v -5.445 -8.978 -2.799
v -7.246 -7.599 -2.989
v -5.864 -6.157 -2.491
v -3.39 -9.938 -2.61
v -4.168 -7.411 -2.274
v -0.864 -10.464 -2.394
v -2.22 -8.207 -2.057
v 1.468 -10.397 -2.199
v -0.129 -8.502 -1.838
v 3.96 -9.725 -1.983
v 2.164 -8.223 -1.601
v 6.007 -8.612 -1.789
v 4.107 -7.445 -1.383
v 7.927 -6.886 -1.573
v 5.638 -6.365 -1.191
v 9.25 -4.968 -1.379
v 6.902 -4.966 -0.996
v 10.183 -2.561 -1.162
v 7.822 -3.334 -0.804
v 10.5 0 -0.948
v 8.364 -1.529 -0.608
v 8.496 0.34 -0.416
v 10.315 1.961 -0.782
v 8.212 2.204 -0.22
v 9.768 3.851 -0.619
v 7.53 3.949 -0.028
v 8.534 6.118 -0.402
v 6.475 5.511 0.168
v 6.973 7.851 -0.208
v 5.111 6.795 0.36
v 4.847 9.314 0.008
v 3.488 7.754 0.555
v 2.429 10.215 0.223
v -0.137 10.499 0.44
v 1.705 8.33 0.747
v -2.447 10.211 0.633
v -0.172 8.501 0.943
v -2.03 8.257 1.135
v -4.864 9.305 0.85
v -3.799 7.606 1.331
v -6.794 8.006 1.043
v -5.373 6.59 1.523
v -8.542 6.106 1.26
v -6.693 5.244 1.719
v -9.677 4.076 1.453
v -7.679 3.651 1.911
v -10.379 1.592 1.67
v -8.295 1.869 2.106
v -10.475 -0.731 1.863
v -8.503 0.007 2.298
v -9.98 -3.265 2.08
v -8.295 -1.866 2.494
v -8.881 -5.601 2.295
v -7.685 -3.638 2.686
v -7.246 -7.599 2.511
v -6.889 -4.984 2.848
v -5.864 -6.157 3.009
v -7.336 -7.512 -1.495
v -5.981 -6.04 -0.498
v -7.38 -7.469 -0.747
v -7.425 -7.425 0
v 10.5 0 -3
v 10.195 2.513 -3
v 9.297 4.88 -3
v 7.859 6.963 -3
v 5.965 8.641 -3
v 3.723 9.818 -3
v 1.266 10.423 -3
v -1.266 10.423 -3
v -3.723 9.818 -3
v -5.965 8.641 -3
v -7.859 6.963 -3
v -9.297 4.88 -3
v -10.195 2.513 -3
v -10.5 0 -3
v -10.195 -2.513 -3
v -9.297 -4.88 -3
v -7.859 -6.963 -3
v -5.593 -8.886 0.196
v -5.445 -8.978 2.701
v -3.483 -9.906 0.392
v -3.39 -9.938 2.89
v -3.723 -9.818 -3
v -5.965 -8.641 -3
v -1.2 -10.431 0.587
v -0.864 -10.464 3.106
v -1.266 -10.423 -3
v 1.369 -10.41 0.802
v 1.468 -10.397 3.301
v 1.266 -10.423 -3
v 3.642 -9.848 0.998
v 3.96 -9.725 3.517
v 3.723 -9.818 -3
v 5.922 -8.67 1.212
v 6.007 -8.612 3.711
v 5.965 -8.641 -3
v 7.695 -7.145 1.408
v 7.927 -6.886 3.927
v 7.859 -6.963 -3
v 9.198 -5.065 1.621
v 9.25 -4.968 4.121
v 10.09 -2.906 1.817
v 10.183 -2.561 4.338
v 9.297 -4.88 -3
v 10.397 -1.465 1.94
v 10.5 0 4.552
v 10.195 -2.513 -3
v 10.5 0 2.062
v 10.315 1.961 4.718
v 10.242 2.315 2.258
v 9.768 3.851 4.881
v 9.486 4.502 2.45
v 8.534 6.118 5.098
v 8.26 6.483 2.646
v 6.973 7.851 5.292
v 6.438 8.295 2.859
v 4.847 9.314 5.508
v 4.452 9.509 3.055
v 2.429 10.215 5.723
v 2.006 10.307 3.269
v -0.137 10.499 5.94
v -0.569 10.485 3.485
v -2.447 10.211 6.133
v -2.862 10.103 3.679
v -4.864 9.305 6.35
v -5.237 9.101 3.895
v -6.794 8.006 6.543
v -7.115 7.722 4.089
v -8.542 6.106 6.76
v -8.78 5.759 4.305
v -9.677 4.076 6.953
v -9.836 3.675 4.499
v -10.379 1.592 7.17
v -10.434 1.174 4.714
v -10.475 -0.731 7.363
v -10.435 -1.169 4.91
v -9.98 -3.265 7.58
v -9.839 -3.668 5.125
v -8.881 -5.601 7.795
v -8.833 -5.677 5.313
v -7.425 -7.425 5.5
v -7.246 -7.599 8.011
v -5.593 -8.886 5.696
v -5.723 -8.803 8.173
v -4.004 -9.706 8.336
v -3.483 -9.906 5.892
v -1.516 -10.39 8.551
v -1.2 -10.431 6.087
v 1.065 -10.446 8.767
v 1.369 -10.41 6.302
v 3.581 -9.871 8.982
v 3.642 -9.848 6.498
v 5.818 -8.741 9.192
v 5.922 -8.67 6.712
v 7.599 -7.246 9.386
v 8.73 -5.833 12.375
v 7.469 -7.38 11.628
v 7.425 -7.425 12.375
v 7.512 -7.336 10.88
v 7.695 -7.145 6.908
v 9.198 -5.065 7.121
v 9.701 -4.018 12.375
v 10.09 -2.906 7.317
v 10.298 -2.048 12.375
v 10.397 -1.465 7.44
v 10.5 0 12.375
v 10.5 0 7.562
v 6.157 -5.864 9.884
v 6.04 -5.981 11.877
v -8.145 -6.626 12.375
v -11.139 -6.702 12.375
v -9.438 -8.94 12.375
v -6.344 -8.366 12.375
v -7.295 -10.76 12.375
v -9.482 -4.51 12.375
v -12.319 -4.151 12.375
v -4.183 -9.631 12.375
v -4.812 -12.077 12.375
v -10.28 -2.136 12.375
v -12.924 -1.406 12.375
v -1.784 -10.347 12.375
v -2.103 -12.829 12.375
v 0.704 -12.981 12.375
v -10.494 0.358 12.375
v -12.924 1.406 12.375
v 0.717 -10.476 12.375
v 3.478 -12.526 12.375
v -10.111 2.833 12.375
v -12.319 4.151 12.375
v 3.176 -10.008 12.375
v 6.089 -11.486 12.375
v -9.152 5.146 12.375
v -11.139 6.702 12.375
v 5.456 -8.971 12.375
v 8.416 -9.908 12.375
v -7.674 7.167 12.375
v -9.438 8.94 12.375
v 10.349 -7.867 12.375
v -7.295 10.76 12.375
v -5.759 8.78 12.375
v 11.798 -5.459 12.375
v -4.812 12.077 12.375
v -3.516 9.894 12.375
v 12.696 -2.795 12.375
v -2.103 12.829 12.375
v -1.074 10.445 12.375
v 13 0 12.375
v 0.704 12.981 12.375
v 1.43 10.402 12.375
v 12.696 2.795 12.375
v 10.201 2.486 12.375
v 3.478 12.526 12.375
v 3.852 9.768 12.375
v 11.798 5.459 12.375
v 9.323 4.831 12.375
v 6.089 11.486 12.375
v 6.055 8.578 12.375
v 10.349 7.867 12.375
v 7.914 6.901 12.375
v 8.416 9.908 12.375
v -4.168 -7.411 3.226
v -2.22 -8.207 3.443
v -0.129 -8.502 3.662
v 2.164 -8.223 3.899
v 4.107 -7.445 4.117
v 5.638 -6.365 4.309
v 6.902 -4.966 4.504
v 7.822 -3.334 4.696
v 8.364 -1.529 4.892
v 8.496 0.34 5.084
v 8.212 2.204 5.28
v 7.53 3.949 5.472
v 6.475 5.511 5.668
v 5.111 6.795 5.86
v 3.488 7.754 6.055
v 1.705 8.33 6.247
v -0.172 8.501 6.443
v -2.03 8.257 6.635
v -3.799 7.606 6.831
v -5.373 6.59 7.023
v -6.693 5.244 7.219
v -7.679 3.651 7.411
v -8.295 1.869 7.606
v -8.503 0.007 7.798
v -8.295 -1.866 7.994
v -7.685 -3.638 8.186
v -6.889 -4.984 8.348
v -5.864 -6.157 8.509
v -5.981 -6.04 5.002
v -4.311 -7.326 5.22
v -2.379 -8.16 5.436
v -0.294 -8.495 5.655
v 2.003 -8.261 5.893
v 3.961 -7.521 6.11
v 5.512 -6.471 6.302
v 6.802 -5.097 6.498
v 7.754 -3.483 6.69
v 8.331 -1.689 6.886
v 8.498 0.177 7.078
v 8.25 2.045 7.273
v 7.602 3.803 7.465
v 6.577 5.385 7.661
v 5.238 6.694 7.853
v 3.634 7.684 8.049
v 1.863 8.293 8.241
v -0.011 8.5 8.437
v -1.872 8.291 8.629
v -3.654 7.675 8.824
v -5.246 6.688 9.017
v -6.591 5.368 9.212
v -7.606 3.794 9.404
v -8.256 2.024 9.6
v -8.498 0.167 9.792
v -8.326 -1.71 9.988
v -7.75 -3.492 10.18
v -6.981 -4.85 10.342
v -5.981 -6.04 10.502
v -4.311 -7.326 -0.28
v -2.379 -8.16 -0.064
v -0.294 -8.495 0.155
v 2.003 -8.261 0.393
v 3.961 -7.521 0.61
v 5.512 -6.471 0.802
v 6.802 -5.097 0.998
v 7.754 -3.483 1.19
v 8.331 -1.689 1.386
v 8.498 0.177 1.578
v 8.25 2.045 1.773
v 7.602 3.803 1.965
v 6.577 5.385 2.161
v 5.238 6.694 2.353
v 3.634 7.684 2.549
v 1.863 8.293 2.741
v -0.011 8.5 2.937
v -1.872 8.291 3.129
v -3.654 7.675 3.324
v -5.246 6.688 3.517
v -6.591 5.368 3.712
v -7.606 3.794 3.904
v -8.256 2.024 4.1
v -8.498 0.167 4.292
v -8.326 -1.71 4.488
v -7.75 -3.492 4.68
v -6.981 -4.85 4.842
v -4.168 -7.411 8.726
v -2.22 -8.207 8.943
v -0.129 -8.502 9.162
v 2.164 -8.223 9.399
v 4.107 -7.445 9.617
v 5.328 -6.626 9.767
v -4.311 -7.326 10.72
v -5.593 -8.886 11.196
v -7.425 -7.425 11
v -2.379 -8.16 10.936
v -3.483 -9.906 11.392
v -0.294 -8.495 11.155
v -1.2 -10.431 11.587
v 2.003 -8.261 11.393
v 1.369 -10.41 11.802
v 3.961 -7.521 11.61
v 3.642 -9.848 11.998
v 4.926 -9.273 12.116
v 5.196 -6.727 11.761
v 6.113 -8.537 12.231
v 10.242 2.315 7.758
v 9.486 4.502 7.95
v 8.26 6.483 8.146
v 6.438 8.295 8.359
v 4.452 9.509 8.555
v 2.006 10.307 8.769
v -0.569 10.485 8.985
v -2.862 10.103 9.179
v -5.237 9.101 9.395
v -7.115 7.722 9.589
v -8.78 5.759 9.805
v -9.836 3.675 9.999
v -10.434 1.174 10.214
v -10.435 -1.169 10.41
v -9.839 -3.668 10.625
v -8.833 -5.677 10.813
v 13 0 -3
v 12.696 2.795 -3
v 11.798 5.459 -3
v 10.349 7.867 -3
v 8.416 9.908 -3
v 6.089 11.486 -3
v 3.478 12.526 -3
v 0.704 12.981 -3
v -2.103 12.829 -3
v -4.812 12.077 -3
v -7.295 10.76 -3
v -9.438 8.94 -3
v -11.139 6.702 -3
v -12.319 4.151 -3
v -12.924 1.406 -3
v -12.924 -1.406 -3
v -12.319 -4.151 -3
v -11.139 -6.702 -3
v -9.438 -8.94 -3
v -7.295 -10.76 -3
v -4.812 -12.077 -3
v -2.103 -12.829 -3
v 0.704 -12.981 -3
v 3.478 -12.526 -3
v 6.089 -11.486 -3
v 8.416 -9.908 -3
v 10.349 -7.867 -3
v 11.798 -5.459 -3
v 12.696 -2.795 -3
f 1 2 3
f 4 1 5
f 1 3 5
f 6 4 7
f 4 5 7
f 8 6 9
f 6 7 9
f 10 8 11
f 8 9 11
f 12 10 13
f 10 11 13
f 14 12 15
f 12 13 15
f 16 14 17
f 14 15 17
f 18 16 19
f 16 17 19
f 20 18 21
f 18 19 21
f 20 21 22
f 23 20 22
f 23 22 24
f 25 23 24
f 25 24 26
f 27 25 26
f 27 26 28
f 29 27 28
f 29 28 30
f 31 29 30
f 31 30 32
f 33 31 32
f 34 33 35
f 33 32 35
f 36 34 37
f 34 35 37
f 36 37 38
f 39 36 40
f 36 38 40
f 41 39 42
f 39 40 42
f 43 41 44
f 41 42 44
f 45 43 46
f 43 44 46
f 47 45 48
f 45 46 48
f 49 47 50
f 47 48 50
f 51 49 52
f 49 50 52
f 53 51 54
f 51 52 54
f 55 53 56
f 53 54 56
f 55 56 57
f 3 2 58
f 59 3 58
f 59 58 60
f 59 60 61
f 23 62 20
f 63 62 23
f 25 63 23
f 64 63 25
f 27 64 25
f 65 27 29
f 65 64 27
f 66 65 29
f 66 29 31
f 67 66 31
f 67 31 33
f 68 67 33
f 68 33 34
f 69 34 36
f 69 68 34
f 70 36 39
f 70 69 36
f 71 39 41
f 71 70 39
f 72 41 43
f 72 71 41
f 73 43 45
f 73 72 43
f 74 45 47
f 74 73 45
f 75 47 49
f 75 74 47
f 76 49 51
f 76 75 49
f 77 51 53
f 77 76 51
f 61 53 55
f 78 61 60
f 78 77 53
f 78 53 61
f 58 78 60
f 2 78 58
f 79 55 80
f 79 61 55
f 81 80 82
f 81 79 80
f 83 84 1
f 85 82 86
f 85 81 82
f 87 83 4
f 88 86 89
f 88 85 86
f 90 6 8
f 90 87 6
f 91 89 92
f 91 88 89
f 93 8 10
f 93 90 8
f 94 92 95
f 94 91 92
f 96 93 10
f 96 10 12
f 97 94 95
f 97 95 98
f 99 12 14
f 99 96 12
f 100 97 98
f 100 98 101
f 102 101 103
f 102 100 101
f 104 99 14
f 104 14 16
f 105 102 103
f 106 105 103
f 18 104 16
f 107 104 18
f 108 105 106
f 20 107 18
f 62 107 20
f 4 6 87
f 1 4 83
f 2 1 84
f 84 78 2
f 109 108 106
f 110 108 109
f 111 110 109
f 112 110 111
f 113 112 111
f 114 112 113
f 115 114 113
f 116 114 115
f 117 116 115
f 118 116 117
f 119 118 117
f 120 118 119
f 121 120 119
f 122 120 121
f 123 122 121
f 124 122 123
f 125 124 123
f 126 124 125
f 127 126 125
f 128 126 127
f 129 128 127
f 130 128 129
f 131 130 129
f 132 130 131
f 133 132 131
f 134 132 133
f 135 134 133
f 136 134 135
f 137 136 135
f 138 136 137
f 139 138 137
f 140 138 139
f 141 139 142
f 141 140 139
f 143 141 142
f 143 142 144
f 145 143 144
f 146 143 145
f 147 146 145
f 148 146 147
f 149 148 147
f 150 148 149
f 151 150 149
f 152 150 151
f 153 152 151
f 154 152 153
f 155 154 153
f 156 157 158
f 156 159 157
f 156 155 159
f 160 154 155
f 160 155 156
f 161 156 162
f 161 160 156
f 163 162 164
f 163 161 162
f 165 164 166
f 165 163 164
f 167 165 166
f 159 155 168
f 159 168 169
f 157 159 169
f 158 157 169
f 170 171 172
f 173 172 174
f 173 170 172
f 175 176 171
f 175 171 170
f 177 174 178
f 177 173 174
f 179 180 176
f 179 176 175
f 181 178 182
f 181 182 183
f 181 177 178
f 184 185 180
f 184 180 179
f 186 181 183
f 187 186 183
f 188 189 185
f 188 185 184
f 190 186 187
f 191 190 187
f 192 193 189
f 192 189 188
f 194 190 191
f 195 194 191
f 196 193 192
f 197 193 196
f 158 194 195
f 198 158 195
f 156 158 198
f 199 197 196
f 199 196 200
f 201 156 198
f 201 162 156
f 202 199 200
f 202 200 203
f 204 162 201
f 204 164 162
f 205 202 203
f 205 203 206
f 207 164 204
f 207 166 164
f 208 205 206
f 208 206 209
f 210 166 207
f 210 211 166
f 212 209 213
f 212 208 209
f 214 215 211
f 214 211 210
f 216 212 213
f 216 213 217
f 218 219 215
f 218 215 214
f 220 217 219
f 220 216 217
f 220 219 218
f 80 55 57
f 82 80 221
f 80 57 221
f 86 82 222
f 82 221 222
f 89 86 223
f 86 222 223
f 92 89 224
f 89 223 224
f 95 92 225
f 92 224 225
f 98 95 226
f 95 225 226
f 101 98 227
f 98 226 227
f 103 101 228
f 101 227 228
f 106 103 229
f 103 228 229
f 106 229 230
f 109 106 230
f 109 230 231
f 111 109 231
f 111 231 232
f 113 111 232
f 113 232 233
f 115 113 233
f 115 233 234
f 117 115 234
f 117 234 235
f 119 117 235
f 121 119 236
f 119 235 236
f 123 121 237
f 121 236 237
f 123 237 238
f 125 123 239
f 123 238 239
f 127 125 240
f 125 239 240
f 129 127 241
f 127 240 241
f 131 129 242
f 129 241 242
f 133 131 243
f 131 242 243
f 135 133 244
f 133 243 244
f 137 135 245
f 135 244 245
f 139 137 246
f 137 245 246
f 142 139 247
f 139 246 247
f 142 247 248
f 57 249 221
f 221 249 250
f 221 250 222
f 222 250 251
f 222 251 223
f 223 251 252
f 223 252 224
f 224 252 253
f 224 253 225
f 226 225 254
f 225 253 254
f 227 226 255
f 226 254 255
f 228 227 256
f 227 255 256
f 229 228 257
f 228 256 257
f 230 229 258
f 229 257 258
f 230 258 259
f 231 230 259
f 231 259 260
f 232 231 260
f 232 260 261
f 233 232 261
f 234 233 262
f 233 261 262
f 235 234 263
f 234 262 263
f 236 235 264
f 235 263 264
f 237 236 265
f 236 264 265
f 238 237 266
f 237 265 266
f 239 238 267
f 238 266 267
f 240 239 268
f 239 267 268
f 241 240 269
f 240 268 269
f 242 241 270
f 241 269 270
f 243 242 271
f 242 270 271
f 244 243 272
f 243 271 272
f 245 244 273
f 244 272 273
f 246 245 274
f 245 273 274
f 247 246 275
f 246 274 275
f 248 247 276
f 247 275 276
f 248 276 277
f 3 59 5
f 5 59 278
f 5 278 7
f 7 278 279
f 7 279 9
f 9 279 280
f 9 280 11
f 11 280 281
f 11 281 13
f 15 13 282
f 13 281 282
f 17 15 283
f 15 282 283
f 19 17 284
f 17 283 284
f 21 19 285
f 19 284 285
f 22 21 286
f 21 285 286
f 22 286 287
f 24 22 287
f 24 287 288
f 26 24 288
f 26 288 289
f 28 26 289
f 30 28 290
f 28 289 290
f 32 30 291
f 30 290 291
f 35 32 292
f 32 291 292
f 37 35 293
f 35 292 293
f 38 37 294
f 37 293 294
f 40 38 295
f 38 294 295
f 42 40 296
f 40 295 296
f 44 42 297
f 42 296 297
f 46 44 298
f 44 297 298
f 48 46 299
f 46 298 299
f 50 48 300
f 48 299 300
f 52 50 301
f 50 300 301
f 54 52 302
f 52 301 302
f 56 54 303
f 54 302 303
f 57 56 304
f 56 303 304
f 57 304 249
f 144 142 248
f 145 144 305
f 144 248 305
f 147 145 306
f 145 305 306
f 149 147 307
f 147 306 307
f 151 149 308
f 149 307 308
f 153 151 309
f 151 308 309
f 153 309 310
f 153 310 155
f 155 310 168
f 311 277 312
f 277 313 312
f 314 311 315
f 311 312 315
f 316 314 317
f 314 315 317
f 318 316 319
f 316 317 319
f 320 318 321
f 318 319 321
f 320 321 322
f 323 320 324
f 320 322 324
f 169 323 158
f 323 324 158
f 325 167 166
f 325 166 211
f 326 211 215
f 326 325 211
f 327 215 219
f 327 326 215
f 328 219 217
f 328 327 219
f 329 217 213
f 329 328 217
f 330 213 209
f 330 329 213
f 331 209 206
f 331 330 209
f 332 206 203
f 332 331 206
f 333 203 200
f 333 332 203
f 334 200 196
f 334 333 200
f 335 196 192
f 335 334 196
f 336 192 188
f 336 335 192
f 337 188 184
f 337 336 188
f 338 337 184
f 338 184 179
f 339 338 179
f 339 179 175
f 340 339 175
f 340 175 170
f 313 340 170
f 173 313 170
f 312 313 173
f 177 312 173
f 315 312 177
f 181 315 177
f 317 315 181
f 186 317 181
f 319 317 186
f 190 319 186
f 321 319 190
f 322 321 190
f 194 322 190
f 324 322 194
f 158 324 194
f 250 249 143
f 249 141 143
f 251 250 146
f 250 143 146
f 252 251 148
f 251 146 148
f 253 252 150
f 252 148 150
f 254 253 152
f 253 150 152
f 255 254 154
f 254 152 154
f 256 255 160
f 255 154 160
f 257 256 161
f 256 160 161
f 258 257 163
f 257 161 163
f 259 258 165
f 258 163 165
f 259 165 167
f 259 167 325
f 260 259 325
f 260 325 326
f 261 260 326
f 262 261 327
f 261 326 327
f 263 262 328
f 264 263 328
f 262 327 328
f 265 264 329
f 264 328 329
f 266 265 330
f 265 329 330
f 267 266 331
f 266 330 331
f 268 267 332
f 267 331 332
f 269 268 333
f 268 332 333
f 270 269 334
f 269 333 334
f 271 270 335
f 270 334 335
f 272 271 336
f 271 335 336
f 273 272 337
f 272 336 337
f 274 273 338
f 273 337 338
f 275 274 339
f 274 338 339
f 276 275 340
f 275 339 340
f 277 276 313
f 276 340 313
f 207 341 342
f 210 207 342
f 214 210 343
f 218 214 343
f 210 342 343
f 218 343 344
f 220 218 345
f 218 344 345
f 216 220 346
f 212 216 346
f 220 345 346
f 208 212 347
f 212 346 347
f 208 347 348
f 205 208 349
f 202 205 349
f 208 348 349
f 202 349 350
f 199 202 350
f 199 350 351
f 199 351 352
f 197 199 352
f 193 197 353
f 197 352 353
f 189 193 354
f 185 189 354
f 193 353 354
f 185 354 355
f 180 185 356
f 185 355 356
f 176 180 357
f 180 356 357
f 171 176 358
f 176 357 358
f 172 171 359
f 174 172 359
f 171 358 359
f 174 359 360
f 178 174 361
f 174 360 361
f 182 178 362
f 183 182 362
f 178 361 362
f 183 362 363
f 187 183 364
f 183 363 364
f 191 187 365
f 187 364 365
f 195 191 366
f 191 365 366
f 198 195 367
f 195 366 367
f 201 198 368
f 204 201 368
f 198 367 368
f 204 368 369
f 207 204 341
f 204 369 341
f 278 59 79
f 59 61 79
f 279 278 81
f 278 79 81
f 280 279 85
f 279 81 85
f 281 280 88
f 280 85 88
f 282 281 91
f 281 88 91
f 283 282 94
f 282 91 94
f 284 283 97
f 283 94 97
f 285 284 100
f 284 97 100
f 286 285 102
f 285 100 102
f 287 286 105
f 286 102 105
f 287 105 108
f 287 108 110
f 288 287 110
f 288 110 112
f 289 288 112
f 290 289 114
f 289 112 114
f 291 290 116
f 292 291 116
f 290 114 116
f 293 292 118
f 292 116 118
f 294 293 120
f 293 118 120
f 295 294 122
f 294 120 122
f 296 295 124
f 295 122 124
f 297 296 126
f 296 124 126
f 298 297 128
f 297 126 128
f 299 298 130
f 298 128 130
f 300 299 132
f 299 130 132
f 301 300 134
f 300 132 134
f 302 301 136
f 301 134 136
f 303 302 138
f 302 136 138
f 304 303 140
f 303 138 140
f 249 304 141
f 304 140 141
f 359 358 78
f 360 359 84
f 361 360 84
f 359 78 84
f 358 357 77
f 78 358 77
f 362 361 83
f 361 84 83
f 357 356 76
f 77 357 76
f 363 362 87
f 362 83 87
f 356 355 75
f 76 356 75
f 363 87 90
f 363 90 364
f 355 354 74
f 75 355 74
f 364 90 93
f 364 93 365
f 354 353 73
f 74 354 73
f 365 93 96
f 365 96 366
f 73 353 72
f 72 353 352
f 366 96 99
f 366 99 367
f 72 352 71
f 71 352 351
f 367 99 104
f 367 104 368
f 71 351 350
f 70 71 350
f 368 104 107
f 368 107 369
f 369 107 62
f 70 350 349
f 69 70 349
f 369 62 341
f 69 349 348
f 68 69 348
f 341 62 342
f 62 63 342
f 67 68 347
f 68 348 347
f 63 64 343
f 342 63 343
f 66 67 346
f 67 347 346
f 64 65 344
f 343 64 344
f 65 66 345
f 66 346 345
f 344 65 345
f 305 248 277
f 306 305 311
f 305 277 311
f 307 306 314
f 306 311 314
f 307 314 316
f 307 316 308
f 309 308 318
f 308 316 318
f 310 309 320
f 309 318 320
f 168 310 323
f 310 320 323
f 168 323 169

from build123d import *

# Parameters (mm, degrees)
EXTRUDE_1_DEPTH          = 12.375
EXTRUDE_1_DEPTH_BACK     = 3
SKETCH_1_R               = 13
CUT_EXTRUDE_1_DEPTH      = 20
CUT_EXTRUDE_1_DEPTH_BACK = 10
SKETCH_2_R               = 10.5
SWEEP_1_PITCH            = 5.5


with BuildPart() as part:
    # 草图1 → 凸台-拉伸1 (new, two sides: drawn at the far end of the back side and taken through both)
    with BuildSketch(Plane.XY.offset(-EXTRUDE_1_DEPTH_BACK)):
        Circle(SKETCH_1_R)
    extrude(amount=EXTRUDE_1_DEPTH + EXTRUDE_1_DEPTH_BACK)

    # 草图2 → 切除-拉伸1 (cut, two sides: drawn at the far end of the back side and taken through both)
    with BuildSketch(Plane.XY.offset(-CUT_EXTRUDE_1_DEPTH_BACK)):
        Circle(SKETCH_2_R)
    extrude(amount=CUT_EXTRUDE_1_DEPTH + CUT_EXTRUDE_1_DEPTH_BACK, mode=Mode.SUBTRACT)

    # 扫描1: the profile of 草图4 screwed along a right-hand helix of 2.25 turns, 14 arcs to a turn; built about Z, then put on its axis
    sweep_1_z = Axis((0, 0, 0), (0, 0, 1))
    sweep_1_corners = [(10.5, 0, 0), (10.5, 0.249236025, -2.989628974), (8.5, 0.207696687, -2.491357479), (8.5, 0.041539337, -0.498271496)]
    with BuildLine(mode=Mode.PRIVATE) as sweep_1_profile:
        Line(sweep_1_corners[0], sweep_1_corners[1])
        Line(sweep_1_corners[1], sweep_1_corners[2])
        Line(sweep_1_corners[2], sweep_1_corners[3])
        Line(sweep_1_corners[3], sweep_1_corners[0])
    sweep_1_cap = Face(sweep_1_profile.wire())
    sweep_1_turn_angles = [0, 12.857142857, 25.714285714, 38.571428571, 51.428571429, 64.285714286, 77.142857143, 90, 102.857142857, 115.714285714, 128.571428571, 141.428571429, 154.285714286, 167.142857143, 180, 192.857142857, 205.714285714, 218.571428571, 231.428571429, 244.285714286, 257.142857143, 270, 282.857142857, 295.714285714, 308.571428571, 321.428571429, 334.285714286, 347.142857143, 360]
    sweep_1_turn_weights = [1, 0.9749279121818236, 1, 0.9749279121818236, 1, 0.9749279121818236, 1, 0.9749279121818236, 1, 0.9749279121818236, 1, 0.9749279121818236, 1, 0.9749279121818236, 1, 0.9749279121818236, 1, 0.9749279121818236, 1, 0.9749279121818236, 1, 0.9749279121818236, 1, 0.9749279121818237, 1, 0.9749279121818236, 1, 0.9749279121818236, 1]
    sweep_1_turn_rails = [Edge.make_bspline([Vector(p[0], p[1], 0).rotate(sweep_1_z, sweep_1_turn_angles[k]) / sweep_1_turn_weights[k] + Vector(0, 0, p[2] + SWEEP_1_PITCH * sweep_1_turn_angles[k] / 360) for k in range(29)], [0, 0, 0, 1, 1, 2, 2, 3, 3, 4, 4, 5, 5, 6, 6, 7, 7, 8, 8, 9, 9, 10, 10, 11, 11, 12, 12, 13, 13, 14, 14, 14], 2, sweep_1_turn_weights) for p in sweep_1_corners]
    sweep_1_turn_sides = [Face.make_surface_from_curves(sweep_1_turn_rails[p[0]], sweep_1_turn_rails[p[1]]) for p in [(0, 1), (1, 2), (2, 3), (3, 0)]]
    sweep_1_last_angles = [720, 732.857142857, 745.714285714, 758.571428571, 771.428571429, 784.285714286, 797.142857143, 803.571428571, 810]
    sweep_1_last_weights = [1, 0.9749279121818237, 1, 0.9749279121818235, 1, 0.9749279121818237, 1, 0.9937122098932412, 1]
    sweep_1_last_rails = [Edge.make_bspline([Vector(p[0], p[1], 0).rotate(sweep_1_z, sweep_1_last_angles[k]) / sweep_1_last_weights[k] + Vector(0, 0, p[2] + SWEEP_1_PITCH * sweep_1_last_angles[k] / 360) for k in range(9)], [0, 0, 0, 1, 1, 2, 2, 3, 3, 4, 4, 4], 2, sweep_1_last_weights) for p in sweep_1_corners]
    sweep_1_last_sides = [Face.make_surface_from_curves(sweep_1_last_rails[p[0]], sweep_1_last_rails[p[1]]) for p in [(0, 1), (1, 2), (2, 3), (3, 0)]]
    sweep_1 = Plane(origin=(0, 0, 0), x_dir=(-0.7071067811865414, -0.7071067811865537, 0), z_dir=(0, 0, 1)) * Solid(Shell([*[p.moved(Location((0, 0, SWEEP_1_PITCH * i))) for i in range(2) for p in sweep_1_turn_sides], *sweep_1_last_sides, sweep_1_cap, sweep_1_cap.rotate(sweep_1_z, 810).moved(Location((0, 0, SWEEP_1_PITCH * 810 / 360)))]))
    add(sweep_1)


solid = part.part
